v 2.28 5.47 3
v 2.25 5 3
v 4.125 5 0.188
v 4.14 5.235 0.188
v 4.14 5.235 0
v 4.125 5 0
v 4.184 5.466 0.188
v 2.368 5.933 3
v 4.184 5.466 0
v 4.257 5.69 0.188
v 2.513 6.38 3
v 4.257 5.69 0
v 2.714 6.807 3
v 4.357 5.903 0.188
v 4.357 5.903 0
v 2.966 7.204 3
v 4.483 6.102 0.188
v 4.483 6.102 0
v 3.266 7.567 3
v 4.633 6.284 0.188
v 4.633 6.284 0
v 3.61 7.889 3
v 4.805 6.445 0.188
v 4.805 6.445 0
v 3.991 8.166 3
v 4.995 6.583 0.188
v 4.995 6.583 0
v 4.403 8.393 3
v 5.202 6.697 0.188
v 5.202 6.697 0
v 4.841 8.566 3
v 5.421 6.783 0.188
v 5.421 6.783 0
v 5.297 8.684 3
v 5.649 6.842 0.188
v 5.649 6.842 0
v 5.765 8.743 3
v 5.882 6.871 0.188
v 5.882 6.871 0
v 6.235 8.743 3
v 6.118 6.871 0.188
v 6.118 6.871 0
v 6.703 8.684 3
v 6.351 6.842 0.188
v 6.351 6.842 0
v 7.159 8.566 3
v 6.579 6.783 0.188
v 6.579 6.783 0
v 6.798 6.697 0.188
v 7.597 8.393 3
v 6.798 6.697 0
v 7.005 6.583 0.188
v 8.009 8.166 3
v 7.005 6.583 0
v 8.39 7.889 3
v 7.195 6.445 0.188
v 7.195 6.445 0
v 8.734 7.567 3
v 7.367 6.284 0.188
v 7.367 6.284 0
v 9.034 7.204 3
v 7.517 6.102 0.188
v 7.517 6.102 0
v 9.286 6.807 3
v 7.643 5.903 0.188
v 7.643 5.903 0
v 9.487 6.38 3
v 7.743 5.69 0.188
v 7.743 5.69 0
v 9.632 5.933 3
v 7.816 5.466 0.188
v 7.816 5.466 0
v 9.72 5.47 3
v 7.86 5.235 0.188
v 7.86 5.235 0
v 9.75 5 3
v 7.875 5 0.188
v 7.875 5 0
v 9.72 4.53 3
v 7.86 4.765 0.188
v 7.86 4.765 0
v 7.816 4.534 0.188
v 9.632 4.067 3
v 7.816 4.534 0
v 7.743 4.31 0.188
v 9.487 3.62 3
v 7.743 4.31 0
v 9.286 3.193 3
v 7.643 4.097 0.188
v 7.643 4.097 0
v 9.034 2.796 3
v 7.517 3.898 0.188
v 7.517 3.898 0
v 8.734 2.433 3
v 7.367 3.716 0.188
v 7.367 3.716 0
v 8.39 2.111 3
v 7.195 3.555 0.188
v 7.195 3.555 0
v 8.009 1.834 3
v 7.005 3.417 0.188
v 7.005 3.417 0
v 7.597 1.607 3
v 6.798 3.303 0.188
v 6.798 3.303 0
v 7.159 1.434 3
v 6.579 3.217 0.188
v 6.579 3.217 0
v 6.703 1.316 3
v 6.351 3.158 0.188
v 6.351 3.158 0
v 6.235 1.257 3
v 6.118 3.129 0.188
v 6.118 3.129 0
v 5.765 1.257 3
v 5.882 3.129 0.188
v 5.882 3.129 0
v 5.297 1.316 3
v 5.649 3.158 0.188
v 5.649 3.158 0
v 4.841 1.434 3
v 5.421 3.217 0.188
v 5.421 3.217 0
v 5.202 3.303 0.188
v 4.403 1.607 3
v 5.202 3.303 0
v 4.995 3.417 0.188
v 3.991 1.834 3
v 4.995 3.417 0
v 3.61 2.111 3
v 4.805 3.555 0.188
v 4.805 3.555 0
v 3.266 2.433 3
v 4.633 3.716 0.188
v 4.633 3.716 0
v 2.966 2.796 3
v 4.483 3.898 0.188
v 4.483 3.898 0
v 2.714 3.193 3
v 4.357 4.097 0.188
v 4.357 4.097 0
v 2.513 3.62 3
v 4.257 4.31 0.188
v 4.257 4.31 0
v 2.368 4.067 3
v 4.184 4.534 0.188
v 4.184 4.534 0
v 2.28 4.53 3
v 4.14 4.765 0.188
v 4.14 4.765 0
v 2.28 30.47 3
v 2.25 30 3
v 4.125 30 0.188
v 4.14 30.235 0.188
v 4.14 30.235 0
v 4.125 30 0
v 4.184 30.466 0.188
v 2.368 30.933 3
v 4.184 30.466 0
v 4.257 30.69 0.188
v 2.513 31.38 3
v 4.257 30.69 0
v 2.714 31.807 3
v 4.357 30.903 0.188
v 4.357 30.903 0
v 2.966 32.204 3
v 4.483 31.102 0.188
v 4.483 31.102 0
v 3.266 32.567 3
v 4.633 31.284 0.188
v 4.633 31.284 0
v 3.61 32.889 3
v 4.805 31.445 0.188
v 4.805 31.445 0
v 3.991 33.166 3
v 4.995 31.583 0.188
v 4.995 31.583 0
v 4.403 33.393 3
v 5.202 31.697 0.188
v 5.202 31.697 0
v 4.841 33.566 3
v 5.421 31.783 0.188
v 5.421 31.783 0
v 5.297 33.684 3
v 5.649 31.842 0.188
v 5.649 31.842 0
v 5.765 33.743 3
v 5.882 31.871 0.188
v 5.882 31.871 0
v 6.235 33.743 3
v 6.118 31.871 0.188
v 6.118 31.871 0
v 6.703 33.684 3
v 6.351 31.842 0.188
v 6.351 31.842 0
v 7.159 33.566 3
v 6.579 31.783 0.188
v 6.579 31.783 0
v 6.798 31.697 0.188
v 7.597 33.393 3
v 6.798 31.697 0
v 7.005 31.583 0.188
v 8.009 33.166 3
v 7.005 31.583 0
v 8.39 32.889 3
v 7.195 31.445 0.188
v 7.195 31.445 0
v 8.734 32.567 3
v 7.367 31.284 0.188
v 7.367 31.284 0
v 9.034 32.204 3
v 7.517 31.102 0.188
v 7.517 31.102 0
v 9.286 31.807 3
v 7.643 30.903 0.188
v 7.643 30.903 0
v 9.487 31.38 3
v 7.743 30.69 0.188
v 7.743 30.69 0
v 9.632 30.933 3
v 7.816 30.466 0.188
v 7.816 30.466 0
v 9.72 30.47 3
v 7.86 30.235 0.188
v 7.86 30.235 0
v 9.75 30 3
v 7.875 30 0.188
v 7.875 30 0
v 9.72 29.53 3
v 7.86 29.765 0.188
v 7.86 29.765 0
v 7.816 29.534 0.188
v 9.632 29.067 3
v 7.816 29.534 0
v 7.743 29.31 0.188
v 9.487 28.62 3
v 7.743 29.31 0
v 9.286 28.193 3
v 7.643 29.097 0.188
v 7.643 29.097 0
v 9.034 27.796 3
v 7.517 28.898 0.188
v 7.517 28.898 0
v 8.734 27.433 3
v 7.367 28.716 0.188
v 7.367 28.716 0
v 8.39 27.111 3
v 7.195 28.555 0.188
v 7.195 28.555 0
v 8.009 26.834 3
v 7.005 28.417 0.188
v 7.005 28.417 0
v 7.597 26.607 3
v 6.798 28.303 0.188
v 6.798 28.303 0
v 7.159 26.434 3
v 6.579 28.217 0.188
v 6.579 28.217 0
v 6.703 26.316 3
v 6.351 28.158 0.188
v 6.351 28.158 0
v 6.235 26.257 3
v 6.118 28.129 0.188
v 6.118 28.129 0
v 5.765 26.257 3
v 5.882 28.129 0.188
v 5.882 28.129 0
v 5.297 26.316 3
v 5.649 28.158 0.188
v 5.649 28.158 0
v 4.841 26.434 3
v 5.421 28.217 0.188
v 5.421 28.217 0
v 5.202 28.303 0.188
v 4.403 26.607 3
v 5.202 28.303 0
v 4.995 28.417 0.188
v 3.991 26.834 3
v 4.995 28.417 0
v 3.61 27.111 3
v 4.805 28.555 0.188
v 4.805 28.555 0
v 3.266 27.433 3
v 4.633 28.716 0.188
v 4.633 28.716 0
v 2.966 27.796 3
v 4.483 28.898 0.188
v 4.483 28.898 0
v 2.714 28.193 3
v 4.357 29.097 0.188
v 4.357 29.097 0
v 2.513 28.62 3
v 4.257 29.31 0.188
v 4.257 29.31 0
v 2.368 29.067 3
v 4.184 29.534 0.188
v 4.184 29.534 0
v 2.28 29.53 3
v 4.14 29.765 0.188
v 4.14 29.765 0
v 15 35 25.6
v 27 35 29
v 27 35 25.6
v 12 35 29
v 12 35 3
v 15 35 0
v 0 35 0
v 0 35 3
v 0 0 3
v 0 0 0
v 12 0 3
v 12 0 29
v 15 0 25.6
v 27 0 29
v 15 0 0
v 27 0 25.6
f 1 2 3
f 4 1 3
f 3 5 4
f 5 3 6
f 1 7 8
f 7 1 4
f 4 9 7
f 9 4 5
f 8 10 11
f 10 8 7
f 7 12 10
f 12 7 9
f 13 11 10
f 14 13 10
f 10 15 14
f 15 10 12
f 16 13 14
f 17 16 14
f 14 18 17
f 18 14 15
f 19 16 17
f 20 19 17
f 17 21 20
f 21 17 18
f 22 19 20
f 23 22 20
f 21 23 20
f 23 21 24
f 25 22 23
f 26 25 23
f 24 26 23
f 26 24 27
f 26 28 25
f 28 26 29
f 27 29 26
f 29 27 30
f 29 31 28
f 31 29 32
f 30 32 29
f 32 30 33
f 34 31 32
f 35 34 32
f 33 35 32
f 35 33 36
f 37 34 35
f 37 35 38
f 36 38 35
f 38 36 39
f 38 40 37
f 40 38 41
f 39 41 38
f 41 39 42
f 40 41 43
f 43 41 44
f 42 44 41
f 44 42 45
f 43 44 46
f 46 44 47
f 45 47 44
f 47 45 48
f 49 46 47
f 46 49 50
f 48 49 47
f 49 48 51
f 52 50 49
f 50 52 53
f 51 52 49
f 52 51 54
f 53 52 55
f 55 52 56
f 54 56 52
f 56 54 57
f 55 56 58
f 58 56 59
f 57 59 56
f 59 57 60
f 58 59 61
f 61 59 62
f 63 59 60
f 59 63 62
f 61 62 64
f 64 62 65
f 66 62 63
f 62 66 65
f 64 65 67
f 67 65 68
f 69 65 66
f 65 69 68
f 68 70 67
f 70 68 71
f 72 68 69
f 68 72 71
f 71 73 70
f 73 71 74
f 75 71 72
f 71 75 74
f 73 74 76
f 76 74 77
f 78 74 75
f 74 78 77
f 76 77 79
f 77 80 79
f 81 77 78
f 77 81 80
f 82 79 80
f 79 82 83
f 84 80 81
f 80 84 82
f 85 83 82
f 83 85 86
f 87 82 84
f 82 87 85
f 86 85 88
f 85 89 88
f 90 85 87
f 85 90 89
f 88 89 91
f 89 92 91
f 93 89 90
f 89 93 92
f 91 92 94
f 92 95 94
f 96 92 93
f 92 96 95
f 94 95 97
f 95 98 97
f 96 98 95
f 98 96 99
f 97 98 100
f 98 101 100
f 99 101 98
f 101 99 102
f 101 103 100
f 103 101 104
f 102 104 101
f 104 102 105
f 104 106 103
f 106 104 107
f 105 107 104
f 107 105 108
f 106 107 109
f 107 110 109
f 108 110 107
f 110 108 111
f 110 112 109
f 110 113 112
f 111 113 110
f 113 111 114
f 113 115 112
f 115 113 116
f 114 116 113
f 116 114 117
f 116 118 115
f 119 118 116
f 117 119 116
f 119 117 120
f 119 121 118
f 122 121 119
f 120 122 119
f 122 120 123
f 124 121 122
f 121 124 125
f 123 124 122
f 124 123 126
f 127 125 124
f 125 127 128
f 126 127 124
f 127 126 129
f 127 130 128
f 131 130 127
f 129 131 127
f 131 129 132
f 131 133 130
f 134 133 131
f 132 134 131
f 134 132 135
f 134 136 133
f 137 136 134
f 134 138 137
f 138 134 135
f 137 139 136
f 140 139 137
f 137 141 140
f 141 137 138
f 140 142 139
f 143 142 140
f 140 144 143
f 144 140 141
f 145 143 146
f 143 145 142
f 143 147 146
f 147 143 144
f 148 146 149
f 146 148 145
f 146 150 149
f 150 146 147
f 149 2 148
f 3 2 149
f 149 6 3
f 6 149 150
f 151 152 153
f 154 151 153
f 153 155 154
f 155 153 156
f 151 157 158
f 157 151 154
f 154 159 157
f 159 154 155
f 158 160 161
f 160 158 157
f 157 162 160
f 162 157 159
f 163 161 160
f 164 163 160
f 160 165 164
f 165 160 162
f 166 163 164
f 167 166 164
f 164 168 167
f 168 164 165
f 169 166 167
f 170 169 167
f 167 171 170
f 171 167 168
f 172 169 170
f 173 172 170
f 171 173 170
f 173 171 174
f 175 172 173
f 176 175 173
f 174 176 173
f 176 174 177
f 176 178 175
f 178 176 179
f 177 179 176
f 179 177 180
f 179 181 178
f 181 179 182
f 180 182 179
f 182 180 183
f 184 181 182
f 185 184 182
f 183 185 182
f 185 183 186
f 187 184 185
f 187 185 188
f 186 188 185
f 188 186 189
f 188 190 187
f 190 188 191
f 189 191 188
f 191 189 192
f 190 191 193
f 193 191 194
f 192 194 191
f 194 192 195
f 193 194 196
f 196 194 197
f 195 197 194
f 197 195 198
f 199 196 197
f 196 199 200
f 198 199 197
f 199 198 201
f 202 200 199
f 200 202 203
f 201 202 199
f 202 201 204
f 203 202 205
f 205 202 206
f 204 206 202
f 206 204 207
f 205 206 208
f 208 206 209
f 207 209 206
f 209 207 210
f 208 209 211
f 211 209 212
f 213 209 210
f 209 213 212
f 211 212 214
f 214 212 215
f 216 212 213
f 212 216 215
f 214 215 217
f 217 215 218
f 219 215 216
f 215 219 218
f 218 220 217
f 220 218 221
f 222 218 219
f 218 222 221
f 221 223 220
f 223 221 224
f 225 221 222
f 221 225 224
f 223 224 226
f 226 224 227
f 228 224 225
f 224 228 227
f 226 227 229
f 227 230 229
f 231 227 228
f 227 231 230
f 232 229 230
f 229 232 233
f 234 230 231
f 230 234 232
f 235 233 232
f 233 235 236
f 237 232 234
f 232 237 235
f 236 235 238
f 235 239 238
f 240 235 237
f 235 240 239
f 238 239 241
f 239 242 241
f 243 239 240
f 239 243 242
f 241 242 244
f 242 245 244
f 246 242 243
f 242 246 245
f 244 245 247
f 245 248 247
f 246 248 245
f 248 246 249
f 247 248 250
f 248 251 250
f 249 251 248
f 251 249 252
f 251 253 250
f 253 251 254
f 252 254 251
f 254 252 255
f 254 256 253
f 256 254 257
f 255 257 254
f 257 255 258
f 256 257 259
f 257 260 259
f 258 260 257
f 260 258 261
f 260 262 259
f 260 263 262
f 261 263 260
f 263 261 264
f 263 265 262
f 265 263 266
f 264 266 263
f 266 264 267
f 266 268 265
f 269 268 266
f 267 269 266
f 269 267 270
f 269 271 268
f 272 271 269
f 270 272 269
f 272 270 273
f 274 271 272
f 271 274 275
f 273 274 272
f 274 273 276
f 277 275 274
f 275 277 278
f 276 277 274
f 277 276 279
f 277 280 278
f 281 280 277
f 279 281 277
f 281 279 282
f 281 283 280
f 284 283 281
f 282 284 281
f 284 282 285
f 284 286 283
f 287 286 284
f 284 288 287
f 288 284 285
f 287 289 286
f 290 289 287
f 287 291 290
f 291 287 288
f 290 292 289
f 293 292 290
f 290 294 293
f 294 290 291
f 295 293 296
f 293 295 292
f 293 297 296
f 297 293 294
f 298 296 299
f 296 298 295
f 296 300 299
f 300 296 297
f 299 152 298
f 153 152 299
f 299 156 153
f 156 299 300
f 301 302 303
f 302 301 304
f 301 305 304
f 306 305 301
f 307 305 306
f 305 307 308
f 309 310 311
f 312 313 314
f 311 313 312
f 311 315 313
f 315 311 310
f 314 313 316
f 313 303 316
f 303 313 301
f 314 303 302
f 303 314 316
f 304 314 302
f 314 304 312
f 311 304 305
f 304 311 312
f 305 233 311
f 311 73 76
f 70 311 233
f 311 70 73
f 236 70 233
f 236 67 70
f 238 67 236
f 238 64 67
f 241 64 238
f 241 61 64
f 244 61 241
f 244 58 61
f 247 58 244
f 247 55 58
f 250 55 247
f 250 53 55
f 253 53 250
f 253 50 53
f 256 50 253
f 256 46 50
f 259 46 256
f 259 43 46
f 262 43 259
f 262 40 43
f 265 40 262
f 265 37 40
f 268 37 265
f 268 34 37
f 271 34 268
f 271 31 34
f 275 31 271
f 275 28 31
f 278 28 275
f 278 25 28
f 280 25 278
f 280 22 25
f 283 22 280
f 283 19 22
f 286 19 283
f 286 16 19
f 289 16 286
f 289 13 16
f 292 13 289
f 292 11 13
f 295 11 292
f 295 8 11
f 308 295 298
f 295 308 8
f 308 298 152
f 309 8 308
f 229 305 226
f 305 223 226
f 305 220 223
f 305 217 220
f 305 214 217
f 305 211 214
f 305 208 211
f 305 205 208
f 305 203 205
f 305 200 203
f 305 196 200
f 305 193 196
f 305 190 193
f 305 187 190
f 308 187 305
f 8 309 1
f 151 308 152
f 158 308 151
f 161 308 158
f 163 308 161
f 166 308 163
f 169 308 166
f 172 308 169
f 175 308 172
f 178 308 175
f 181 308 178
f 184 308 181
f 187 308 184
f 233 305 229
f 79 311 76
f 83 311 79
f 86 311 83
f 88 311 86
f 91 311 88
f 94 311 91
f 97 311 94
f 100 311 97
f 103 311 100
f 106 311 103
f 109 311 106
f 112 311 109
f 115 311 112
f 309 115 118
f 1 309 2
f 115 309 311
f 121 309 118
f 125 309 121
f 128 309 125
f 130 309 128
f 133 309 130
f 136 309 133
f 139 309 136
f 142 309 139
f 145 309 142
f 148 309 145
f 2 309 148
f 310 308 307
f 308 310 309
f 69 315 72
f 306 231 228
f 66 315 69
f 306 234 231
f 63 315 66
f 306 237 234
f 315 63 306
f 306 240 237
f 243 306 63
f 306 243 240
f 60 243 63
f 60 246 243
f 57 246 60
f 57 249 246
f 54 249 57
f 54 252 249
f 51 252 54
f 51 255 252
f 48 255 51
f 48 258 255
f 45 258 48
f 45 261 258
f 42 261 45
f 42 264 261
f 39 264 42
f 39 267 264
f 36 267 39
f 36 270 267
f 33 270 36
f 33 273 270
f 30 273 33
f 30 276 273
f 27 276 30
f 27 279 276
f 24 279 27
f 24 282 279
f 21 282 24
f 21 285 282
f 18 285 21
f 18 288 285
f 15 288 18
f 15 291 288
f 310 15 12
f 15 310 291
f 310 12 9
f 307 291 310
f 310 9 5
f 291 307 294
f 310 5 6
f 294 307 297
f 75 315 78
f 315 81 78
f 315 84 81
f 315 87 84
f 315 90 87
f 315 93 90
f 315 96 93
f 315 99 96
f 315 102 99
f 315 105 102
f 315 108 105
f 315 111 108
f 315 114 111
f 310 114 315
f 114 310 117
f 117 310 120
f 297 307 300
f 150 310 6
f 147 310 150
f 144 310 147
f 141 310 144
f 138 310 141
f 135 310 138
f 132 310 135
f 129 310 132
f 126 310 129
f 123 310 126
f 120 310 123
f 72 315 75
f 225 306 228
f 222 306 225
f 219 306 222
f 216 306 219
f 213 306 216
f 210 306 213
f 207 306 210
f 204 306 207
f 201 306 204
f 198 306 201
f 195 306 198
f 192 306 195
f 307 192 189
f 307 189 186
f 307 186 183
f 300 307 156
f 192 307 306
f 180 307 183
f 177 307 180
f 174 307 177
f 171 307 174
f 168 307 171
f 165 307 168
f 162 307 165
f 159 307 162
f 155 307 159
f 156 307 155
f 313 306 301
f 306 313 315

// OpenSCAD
// file: Parts/Screw.scad
// created by IndiePandaaaaa | Lukas

$fn = 50;

function cone_diameter(diameter) = diameter * 2;

function cone_diameter_cutout(diameter) = diameter * 2 + 0.5;

function cone_height(diameter) = diameter * 0.75;

module screw(diameter, length = 12, cutout_sample = false) {
  module base_model(diameter, length, cone_height, cone_diameter, offset = 0) {
    rotate_extrude() {
      polygon([
          [0, 0],
          [(diameter + offset) / 2, 0],
          [(diameter + offset) / 2, (length + offset) - (cone_height + offset)],
          [(cone_diameter + offset) / 2, length + offset],
          [0, length + offset],
        ]);
    }
  }

  if (length < diameter) {
    echo("Screw is too short");
    length = diameter + 5;
    echo("New length is: ", length);
  }

  if (!cutout_sample) {
    translate([0, 0, -length])
      difference() {
        base_model(diameter, length, cone_height(diameter), cone_diameter(diameter));

        // top cross part
        translate([0, 0, length - (cone_height(diameter) - diameter / 2) + .1])
          difference() {
            rotate([0, 0, 45])
              rotate_extrude() {
                polygon([
                    [0, 0],
                    [diameter * 1.4 / 2, 0],
                    [cone_diameter(diameter) / 3, cone_height(diameter) - diameter / 2],
                    [0, cone_height(diameter) - diameter / 2],
                  ]);
              }
            for (i = [0 : 1 : 3]) {
              rotate([0, 0, 90 * i])
                translate([diameter / 3.18 / 2, diameter / 3.18 / 2, 0]) cube(cone_height(diameter));
            }
          }
      }
  } else {
    offset = 0;
    diameter = cone_diameter_cutout(diameter) / 2;  // is duplicated by function, used to reduce error
    translate([0, 0, -length - offset / 2]) {
      base_model(diameter, length, cone_height(diameter), cone_diameter(diameter), offset);
      translate([0, 0, length]) cylinder(r = diameter, h = 50);
    }
  }
}

module screw_corehole(diameter_screw, diameter_core, unthreaded_length, length = 12) {
  union() {
    screw(diameter_screw, unthreaded_length, true);
    translate([0, 0, -length]) cylinder(d = diameter_core, h = length - unthreaded_length + .1);
  }
}

translate([20, 0, 0]) screw(3.5, cutout_sample = false);
screw_corehole(diameter_screw = 3, diameter_core = 2.5, unthreaded_length = 15, length = 20);
// main file
// created by IndiePandaaaaa|Lukas

use <Parts/Screw.scad>

TOLERANCE = 0.1;
THICKNESS = 3;
SCREW_OD = 3.5;

SCREWS_2 = true;
SCREWS_2_DIST = 25;  // IKEA PLATSA hole distance

BRACKET_INNER_HEIGHT = 26;  // height tplink ethernet switch 8 port
BRACKET_SCREW_DEPTH = 12;
BRACKET_UPPER_WIDTH = 12;
BRACKET_WIDTH = SCREWS_2_DIST + SCREW_OD * 2 + 1.5 * 2;  // if too low SCREWS_2 has priority

difference() {
  translate([0, BRACKET_WIDTH, 0]) rotate([90, 0, 0])
    linear_extrude(BRACKET_WIDTH) {
      polygon([
          [0, 0],
          [BRACKET_SCREW_DEPTH + THICKNESS, 0],
          [BRACKET_SCREW_DEPTH + THICKNESS, BRACKET_INNER_HEIGHT + TOLERANCE - 0.5],
        // -0.5 fitting for device
          [BRACKET_SCREW_DEPTH + THICKNESS + BRACKET_UPPER_WIDTH, BRACKET_INNER_HEIGHT + TOLERANCE - 0.5],
          [BRACKET_SCREW_DEPTH + THICKNESS + BRACKET_UPPER_WIDTH, BRACKET_INNER_HEIGHT + THICKNESS],
          [BRACKET_SCREW_DEPTH, BRACKET_INNER_HEIGHT + THICKNESS],
          [BRACKET_SCREW_DEPTH, THICKNESS],
          [0, THICKNESS],
        ]);
    }

  for (i = [0:1]) {
    if (SCREWS_2) {
      translate([BRACKET_SCREW_DEPTH / 2,
          (BRACKET_WIDTH - SCREWS_2_DIST - SCREW_OD - 1.5) + SCREWS_2_DIST * i, THICKNESS])
        screw(SCREW_OD, 12, true);
    } else {
      translate([BRACKET_SCREW_DEPTH / 2, BRACKET_WIDTH / 2, THICKNESS])
        screw(SCREW_OD, 12, true);
    }
  }
}
